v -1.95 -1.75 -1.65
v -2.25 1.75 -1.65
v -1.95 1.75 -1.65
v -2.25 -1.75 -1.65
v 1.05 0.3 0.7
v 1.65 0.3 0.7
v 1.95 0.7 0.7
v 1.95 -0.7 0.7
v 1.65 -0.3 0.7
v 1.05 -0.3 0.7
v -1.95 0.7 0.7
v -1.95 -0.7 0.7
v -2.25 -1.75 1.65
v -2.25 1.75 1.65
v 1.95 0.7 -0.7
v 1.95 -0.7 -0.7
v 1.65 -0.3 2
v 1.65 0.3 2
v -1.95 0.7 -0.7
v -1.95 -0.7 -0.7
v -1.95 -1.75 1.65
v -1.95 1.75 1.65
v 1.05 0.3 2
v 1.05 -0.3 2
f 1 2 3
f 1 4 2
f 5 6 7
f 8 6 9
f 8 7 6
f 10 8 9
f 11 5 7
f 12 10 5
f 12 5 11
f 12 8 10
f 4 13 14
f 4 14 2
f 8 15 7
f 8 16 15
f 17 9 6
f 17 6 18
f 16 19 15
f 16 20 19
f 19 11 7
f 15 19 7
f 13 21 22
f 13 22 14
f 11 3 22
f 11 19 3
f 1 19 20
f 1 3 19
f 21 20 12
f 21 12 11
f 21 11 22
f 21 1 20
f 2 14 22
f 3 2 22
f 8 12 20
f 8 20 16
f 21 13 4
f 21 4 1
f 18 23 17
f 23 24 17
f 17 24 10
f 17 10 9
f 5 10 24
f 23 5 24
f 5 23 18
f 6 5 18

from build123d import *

# Parameters (mm, degrees)
F1_DEPTH = 1.75
F2_DEPTH = 0.7
F0_W     = 0.6
F0_H     = 1.3
F3_DEPTH = 0.3


with BuildPart() as f1:
    # F0 (on Front) → F1 (new body, symmetric)
    with BuildSketch(Plane.XZ):
        Polygon((-1.95, -1.65), (-1.95, -0.7), (-1.95, 0.7), (-1.95, 1.65), (-2.25, 1.65), (-2.25, -1.65), align=None)
    extrude(amount=F1_DEPTH, both=True)

    # F0 (on Front) → F2 (join, symmetric)
    with BuildSketch(Plane.XZ):
        Polygon((1.95, -0.7), (1.95, 0.7), (1.65, 0.7), (1.05, 0.7), (-1.95, 0.7), (-1.95, -0.7), align=None)
    extrude(amount=F2_DEPTH, both=True)

    # F0 (on Front) → F3 (join, symmetric)
    with BuildSketch(Plane.XZ):
        with Locations((1.35, 1.35)):
            Rectangle(F0_W, F0_H)
    extrude(amount=F3_DEPTH, both=True)


solid = f1.part
